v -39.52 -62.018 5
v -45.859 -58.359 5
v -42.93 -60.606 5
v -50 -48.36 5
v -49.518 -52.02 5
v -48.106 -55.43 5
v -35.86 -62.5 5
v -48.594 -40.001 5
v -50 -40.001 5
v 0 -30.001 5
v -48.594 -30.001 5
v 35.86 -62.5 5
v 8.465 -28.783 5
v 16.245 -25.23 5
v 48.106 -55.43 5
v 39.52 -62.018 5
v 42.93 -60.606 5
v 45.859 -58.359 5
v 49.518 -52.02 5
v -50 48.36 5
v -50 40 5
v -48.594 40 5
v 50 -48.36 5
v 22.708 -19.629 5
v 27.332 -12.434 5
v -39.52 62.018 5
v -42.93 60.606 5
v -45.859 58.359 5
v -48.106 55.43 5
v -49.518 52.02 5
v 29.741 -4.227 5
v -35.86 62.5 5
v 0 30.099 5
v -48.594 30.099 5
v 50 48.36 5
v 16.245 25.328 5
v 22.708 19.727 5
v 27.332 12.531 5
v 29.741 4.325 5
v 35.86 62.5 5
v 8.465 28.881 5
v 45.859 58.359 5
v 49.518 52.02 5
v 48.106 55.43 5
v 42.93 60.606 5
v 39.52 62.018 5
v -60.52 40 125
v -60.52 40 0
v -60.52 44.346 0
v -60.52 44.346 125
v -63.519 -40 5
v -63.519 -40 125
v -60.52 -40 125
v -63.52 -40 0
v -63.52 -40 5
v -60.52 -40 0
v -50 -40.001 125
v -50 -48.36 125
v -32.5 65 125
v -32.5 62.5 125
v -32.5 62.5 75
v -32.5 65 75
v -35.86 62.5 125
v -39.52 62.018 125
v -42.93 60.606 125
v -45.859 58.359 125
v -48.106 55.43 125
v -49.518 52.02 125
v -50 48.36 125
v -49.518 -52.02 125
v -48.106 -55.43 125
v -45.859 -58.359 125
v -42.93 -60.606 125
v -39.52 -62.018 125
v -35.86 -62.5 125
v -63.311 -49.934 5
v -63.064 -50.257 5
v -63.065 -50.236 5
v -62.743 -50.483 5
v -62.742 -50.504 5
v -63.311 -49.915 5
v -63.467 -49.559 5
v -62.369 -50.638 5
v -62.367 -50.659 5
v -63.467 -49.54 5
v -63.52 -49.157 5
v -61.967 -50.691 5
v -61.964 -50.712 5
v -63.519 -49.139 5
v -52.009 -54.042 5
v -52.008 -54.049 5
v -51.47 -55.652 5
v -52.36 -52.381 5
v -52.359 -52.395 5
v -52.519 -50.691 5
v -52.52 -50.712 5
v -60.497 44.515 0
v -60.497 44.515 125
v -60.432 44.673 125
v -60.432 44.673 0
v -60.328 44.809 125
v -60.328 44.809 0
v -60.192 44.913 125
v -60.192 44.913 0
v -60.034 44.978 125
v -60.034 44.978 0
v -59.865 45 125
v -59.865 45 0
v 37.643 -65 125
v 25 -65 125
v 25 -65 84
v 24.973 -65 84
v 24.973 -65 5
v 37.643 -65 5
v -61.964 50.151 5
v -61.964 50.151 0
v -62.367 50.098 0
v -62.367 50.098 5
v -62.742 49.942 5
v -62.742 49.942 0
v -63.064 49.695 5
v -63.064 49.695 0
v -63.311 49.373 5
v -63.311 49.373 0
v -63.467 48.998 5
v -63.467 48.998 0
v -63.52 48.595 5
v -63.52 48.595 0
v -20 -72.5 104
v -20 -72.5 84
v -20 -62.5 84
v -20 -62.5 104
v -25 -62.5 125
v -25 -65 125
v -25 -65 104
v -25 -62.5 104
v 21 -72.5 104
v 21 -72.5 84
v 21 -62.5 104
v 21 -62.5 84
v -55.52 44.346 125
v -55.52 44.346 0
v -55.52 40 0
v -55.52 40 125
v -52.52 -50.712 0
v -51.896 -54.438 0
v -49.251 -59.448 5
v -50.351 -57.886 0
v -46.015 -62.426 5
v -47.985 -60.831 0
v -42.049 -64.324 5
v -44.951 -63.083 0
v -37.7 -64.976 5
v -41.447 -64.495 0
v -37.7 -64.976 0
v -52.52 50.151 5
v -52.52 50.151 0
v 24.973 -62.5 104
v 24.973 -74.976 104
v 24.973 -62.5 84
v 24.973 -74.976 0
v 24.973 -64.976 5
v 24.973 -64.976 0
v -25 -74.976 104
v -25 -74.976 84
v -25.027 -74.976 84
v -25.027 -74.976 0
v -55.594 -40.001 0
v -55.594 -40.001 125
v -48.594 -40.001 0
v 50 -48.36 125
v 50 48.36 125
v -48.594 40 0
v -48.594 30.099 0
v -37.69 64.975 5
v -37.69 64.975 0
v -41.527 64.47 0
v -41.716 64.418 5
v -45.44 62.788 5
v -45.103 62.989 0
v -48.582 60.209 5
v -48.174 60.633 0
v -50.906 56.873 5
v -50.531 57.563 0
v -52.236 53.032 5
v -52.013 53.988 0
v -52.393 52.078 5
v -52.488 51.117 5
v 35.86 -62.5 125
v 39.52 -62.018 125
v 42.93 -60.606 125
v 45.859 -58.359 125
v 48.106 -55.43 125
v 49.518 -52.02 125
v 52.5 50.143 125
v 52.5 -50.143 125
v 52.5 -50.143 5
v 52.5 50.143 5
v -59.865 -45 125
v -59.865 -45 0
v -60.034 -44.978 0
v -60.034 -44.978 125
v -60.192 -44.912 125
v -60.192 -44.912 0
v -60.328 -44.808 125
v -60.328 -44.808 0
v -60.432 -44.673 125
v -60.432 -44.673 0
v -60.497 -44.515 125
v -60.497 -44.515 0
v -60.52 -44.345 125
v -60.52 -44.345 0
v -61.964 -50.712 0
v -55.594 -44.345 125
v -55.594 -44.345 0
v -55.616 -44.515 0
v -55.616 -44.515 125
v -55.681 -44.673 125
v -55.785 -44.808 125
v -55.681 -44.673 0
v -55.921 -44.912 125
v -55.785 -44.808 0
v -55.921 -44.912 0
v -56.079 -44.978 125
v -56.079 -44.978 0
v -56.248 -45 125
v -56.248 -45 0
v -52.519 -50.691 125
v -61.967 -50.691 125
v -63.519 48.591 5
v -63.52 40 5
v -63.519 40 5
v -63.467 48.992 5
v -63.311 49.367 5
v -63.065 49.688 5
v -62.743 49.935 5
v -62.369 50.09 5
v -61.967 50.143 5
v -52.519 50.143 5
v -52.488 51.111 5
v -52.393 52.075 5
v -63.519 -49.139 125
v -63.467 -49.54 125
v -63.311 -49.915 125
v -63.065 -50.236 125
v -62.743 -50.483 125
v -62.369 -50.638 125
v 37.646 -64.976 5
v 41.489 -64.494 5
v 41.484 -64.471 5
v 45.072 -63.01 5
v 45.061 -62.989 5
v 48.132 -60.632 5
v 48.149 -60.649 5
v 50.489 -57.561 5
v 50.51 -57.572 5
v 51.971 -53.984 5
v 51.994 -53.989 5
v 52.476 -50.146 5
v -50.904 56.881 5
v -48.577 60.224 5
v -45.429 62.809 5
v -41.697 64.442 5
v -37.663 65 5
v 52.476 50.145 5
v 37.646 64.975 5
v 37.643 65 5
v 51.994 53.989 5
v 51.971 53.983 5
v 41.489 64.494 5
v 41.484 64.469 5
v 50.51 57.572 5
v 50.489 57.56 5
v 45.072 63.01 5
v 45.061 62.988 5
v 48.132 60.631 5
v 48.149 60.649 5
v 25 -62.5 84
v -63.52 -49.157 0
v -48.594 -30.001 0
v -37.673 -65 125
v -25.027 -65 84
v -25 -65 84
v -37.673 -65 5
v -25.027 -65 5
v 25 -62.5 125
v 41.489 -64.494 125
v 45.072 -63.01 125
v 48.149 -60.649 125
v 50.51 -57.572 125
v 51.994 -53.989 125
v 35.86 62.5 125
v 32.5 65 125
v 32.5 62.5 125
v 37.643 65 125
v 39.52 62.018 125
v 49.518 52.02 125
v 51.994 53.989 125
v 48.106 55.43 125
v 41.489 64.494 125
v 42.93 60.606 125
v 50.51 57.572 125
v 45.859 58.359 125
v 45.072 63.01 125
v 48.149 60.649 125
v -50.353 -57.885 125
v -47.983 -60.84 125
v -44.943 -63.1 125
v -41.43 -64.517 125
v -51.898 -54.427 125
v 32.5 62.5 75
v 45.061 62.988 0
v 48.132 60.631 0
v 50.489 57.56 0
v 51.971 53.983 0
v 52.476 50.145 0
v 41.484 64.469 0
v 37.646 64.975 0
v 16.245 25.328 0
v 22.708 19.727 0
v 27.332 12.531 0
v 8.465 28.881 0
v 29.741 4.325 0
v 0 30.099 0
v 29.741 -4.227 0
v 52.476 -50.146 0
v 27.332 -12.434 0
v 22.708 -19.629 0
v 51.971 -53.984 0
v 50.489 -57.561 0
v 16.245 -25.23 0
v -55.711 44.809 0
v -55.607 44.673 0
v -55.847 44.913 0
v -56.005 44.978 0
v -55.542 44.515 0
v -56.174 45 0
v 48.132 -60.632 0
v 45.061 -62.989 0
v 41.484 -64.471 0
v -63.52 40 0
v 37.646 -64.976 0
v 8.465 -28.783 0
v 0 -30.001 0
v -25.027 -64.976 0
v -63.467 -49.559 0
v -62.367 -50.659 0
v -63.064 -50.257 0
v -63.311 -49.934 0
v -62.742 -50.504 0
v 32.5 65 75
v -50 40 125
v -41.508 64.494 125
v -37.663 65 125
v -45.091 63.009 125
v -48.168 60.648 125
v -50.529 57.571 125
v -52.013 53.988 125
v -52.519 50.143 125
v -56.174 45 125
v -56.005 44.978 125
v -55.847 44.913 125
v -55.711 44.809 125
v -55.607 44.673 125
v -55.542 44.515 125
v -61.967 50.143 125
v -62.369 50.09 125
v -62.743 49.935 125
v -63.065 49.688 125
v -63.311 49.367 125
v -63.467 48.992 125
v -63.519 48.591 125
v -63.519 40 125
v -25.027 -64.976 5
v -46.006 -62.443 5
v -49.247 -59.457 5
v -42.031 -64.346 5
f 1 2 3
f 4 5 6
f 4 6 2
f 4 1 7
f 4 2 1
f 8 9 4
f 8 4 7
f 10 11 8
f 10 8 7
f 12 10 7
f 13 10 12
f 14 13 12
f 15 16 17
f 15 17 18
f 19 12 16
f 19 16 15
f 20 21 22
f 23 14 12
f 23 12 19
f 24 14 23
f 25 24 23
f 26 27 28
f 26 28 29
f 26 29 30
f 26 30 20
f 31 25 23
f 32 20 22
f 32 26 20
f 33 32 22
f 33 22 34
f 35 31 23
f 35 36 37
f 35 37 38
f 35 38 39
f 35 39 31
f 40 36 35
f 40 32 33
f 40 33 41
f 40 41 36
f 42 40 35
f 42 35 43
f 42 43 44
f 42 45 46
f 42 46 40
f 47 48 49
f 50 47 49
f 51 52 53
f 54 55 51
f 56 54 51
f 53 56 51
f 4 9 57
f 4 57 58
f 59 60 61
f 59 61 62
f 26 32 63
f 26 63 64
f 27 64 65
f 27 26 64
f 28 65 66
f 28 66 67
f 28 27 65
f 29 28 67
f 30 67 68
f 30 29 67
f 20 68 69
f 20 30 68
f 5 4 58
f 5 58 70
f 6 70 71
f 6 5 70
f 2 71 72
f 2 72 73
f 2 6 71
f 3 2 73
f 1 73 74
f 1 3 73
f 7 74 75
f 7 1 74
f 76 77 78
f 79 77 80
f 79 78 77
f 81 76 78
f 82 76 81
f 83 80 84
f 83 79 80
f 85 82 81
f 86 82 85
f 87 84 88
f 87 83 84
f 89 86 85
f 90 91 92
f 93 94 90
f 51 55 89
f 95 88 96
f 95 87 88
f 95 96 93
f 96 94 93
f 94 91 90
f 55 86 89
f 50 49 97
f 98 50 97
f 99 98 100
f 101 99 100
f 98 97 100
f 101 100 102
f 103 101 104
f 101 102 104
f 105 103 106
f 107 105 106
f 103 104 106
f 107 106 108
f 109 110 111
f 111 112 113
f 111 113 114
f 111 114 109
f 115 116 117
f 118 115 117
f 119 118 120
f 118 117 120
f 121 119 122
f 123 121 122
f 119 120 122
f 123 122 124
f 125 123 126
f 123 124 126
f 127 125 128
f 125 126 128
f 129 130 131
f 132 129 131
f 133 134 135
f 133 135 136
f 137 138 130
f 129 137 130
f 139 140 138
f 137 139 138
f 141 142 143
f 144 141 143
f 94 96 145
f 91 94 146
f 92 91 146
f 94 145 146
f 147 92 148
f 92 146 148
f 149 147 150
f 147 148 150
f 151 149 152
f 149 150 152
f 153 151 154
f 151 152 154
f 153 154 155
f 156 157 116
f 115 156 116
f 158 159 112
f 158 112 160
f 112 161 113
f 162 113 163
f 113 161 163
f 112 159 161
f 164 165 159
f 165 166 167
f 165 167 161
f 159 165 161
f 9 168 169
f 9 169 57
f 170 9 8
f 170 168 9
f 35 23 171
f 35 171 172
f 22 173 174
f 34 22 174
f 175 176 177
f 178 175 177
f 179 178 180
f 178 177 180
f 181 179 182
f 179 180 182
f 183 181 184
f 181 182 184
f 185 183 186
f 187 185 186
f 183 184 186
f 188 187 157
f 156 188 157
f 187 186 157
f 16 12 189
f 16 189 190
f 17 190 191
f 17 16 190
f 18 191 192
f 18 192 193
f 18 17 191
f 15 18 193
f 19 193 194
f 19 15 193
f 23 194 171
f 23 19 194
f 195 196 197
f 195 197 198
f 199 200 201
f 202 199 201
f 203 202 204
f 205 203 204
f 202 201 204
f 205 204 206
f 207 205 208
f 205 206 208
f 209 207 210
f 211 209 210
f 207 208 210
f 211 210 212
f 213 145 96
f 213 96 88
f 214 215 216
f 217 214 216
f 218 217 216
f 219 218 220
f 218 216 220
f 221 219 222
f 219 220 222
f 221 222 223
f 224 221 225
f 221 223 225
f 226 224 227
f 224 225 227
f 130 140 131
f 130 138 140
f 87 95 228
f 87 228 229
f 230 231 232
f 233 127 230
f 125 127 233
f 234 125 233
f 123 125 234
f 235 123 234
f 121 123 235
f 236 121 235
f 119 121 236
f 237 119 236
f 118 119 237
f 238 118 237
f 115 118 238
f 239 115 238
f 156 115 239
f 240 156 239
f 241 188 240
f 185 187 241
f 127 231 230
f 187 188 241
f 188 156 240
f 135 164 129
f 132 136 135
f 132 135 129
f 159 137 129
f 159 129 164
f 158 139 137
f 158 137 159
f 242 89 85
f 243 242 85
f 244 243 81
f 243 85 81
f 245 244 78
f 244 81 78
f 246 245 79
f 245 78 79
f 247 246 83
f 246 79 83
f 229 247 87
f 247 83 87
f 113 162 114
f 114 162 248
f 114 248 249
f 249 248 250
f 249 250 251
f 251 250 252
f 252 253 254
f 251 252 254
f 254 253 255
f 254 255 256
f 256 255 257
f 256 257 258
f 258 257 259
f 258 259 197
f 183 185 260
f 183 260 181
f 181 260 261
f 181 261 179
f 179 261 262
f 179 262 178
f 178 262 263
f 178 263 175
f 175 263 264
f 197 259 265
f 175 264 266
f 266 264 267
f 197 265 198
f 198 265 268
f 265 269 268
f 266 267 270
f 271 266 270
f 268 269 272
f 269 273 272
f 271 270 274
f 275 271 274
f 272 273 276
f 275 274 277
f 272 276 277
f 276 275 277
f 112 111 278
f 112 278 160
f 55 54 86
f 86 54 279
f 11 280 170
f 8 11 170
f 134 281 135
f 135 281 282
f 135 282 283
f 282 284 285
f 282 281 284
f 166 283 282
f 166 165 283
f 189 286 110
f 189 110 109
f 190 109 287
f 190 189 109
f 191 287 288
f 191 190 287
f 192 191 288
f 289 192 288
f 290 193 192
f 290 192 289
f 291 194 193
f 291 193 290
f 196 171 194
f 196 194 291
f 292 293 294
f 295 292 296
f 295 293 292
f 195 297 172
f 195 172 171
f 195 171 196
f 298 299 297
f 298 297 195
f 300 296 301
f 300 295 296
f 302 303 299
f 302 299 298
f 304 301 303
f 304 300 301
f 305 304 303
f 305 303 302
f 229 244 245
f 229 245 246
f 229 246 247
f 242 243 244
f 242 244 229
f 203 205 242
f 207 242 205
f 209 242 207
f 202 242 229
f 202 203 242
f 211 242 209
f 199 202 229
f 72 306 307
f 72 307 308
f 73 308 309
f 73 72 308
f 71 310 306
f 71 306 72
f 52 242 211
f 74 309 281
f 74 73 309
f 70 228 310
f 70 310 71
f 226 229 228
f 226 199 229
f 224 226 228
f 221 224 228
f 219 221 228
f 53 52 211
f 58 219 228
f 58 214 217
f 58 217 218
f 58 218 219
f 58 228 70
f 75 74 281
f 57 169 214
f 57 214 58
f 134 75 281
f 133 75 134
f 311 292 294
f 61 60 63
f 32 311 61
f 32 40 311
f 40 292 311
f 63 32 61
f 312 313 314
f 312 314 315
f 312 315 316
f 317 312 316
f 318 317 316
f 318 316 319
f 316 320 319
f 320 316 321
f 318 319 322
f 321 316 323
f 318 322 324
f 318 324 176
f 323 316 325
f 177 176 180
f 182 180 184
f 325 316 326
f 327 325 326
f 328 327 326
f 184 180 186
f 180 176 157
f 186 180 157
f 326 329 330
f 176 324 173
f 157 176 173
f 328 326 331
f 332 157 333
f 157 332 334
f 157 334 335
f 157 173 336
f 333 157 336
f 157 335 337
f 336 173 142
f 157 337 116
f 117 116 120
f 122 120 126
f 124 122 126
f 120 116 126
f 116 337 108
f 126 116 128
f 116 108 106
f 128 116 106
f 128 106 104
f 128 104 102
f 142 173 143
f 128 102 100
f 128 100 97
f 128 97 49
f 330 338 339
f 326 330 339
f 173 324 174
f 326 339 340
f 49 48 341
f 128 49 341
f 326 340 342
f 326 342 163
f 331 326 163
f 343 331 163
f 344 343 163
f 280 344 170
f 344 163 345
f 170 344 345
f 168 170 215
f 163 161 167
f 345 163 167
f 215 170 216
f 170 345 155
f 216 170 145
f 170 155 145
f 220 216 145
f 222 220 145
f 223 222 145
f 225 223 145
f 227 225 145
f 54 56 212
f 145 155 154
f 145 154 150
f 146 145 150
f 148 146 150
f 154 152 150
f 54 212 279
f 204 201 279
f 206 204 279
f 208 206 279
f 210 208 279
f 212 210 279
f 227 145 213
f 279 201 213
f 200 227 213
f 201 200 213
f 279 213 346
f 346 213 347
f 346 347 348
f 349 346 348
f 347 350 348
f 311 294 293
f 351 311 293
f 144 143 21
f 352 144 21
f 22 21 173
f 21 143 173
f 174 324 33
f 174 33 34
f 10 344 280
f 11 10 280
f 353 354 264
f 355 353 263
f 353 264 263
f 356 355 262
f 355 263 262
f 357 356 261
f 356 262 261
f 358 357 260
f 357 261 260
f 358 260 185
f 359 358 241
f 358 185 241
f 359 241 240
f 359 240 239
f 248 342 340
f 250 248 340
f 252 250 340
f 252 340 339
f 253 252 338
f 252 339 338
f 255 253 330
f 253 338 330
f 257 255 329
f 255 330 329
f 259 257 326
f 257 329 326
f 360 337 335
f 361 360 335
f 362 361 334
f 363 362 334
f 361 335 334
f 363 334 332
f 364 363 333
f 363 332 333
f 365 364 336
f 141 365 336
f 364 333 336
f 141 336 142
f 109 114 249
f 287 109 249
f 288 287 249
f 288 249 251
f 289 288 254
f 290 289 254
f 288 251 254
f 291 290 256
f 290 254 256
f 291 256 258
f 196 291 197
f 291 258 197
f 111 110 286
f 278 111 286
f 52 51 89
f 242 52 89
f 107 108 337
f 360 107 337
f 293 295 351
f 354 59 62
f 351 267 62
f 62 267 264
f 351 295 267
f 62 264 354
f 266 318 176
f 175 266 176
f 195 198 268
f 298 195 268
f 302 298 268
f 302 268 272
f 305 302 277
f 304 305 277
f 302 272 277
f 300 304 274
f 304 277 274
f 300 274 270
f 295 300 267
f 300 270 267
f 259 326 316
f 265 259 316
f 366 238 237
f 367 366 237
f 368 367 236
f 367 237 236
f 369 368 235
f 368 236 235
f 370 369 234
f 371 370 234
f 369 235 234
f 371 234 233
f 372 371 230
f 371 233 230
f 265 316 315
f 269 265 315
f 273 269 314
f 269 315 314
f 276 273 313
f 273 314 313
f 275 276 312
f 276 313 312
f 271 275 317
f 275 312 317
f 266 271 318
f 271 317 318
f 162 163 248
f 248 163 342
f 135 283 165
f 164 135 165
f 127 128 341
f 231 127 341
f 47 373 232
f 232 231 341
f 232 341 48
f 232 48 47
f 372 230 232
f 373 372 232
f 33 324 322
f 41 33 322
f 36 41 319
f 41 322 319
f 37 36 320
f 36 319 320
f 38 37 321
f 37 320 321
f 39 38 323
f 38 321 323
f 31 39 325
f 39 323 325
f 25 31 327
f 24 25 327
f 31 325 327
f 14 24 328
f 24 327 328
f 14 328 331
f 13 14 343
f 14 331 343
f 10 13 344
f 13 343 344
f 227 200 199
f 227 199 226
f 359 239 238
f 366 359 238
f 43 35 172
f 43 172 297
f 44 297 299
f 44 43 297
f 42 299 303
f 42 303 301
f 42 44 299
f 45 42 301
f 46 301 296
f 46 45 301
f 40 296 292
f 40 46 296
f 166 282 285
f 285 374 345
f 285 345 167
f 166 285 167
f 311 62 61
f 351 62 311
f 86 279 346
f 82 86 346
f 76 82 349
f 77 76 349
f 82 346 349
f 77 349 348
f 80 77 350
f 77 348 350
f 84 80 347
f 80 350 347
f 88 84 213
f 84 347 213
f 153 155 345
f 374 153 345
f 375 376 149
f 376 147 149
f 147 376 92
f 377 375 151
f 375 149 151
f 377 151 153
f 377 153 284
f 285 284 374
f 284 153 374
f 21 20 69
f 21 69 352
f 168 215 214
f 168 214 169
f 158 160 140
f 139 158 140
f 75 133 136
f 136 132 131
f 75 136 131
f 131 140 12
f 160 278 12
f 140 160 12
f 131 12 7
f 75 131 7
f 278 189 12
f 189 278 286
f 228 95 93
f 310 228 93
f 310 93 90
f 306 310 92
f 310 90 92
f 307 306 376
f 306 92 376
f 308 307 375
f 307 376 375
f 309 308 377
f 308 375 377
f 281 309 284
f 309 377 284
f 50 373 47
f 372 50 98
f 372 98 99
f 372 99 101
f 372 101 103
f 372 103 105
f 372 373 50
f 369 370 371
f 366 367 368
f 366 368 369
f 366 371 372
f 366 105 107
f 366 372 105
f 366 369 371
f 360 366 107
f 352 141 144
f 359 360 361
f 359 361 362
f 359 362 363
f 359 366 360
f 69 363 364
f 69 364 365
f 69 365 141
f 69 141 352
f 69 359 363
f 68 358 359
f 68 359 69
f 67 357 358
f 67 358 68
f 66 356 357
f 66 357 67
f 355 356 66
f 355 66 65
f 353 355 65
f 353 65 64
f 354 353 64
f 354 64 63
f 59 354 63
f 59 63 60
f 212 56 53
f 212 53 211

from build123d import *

# Parameters (mm, degrees)
PAD_DEPTH       = 5
PAD001_DEPTH    = 120
POCKET_DEPTH    = 125
POCKET001_DEPTH = 5
SKETCH005_W     = 65
SKETCH005_H     = 14.081008
POCKET002_DEPTH = 50
SKETCH006_W     = 50
SKETCH006_H     = 12.788605
POCKET003_DEPTH = 41
PAD003_DEPTH    = 84
PAD004_DEPTH    = 20


with BuildPart() as part:
    # Sketch → Pad (new body)
    with BuildSketch(Plane.XY):
        with BuildLine():
            Line((-37.700377, -64.976087), (37.645855, -64.976087))
            ThreePointArc((37.645855, -64.976087), (48.132338, -60.632444), (52.475981, -50.145961))
            Line((52.475981, -50.145961), (52.475981, 50.144628))
            ThreePointArc((52.475981, 50.144628), (48.132338, 60.63111), (37.645855, 64.974754))
            Line((37.645855, 64.974754), (-37.689561, 64.974754))
            ThreePointArc((-37.689561, 64.974754), (-48.173873, 60.63328), (-52.519686, 50.150766))
            Line((-52.519686, 50.150766), (-61.964051, 50.150766))
            ThreePointArc((-61.964051, 50.150766), (-63.064051, 49.695131), (-63.519686, 48.595131))
            Line((-63.519686, 48.595131), (-63.519686, -49.156657))
            ThreePointArc((-63.519686, -49.156657), (-63.064051, -50.256657), (-61.964051, -50.712292))
            Line((-52.519686, -50.712292), (-61.964051, -50.712292))
            ThreePointArc((-52.519686, -50.712292), (-47.984683, -60.830796), (-37.700377, -64.976087))
        make_face()
    extrude(amount=PAD_DEPTH)

    # Sketch001 (on Face14 of Pad) → Pad001 (join)
    with BuildSketch(Plane.XY.offset(5)):
        with BuildLine():
            Line((-37.672841, -65), (37.643326, -65))
            ThreePointArc((37.643326, -65), (48.148581, -60.648581), (52.5, -50.143326))
            Line((52.5, -50.143326), (52.5, 50.143326))
            ThreePointArc((52.5, 50.143326), (48.148581, 60.648581), (37.643326, 65))
            Line((37.643326, 65), (-37.662754, 65))
            ThreePointArc((-37.662754, 65), (-48.168272, 60.648318), (-52.519428, 50.142583))
            Line((-52.519428, 50.142583), (-61.967391, 50.142583))
            ThreePointArc((-61.967391, 50.142583), (-63.064847, 49.688002), (-63.519428, 48.590546))
            Line((-63.519428, 48.590546), (-63.519428, -49.13867))
            ThreePointArc((-63.519428, -49.13867), (-63.064847, -50.236126), (-61.967391, -50.690707))
            Line((-52.519428, -50.690707), (-61.967391, -50.690707))
            ThreePointArc((-52.519428, -50.690707), (-47.982752, -60.840359), (-37.672841, -65))
        make_face()
        with BuildLine():
            Line((-35.860247, -62.5), (35.860247, -62.5))
            ThreePointArc((35.860247, -62.5), (45.858562, -58.358562), (50, -48.360247))
            Line((50, -48.360247), (50, 48.360247))
            ThreePointArc((50, 48.360247), (45.858562, 58.358562), (35.860247, 62.5))
            Line((35.860247, 62.5), (-35.860247, 62.5))
            ThreePointArc((-35.860247, 62.5), (-45.858562, 58.358562), (-50, 48.360247))
            Line((-50, 48.360247), (-50, -48.360247))
            ThreePointArc((-50, -48.360247), (-45.858562, -58.358562), (-35.860247, -62.5))
        make_face(mode=Mode.SUBTRACT)
    extrude(amount=PAD001_DEPTH)

    # Sketch002 (on Face4 of Pad001) → Pocket (cut)
    with BuildSketch(Plane(origin=(0, 0, 0), x_dir=(1, 0, 0), z_dir=(0, 0, -1))):
        with BuildLine():
            Line((-63.519686, 40), (-63.519686, -40))
            Line((-63.519686, -40), (-60.519686, -40))
            Line((-60.519686, -40), (-60.519686, -44.345519))
            ThreePointArc((-60.519686, -44.345519), (-60.327906, -44.808517), (-59.864908, -45.000297))
            Line((-59.864908, -45.000297), (-56.174464, -45.000297))
            ThreePointArc((-56.174464, -45.000297), (-55.711466, -44.808517), (-55.519686, -44.345519))
            Line((-55.519686, -44.345519), (-55.519686, -40))
            Line((-55.519686, -40), (-48.593648, -40))
            Line((-48.593648, -40), (-48.593648, 40.000547))
            Line((-55.593648, 40.000547), (-48.593648, 40.000547))
            Line((-55.593648, 44.345222), (-55.593648, 40.000547))
            ThreePointArc((-55.593648, 44.345222), (-55.785428, 44.80822), (-56.248426, 45))
            Line((-59.864908, 45), (-56.248426, 45))
            ThreePointArc((-59.864908, 45), (-60.327906, 44.80822), (-60.519686, 44.345222))
            Line((-60.519686, 40), (-60.519686, 44.345222))
            Line((-63.519686, 40), (-60.519686, 40))
        make_face()
    extrude(amount=-POCKET_DEPTH, mode=Mode.SUBTRACT)

    # Sketch003 (on Face4 of Pocket) → Pocket001 (cut)
    with BuildSketch(Plane(origin=(0, 0, 0), x_dir=(1, 0, 0), z_dir=(0, 0, -1))):
        with BuildLine():
            ThreePointArc((0, -30.099214), (30.047141, -0.048909), (0, 30.001395))
            Line((0, 30.001395), (-50, 30.001395))
            Line((-50, -30.099214), (-50, 30.001395))
            Line((0, -30.099214), (-50, -30.099214))
        make_face()
    extrude(amount=-POCKET001_DEPTH, mode=Mode.SUBTRACT)

    # Sketch005 (on Face46 of Pocket001) → Pocket002 (cut)
    with BuildSketch(Plane.XY.offset(125)):
        with Locations((0, 65.410759)):
            Rectangle(SKETCH005_W, SKETCH005_H)
    extrude(amount=-POCKET002_DEPTH, mode=Mode.SUBTRACT)

    # Sketch006 (on Face46 of Pocket002) → Pocket003 (cut)
    with BuildSketch(Plane.XY.offset(125)):
        with Locations((0, -63.418121)):
            Rectangle(SKETCH006_W, SKETCH006_H)
    extrude(amount=-POCKET003_DEPTH, mode=Mode.SUBTRACT)

    # Sketch007 (on Face4 of Pocket003) → Pad003 (join)
    with BuildSketch(Plane(origin=(0, 0, 0), x_dir=(1, 0, 0), z_dir=(0, 0, -1))):
        Polygon((-0.027261, 64.976087), (-25.027261, 64.976087), (-25.027261, 74.976087), (24.972739, 74.976087), (24.972739, 64.976087), align=None)
    extrude(amount=-PAD003_DEPTH)

    # Sketch009 (on Face73 of Pad003) → Pad004 (join)
    with BuildSketch(Plane.XY.offset(84)):
        Polygon((-25, -62.5), (-25, -74.976087), (24.972739, -74.976087), (24.972739, -62.5), (21, -62.5), (21, -72.5), (-20, -72.5), (-20, -62.5), align=None)
    extrude(amount=PAD004_DEPTH)


solid = part.part
